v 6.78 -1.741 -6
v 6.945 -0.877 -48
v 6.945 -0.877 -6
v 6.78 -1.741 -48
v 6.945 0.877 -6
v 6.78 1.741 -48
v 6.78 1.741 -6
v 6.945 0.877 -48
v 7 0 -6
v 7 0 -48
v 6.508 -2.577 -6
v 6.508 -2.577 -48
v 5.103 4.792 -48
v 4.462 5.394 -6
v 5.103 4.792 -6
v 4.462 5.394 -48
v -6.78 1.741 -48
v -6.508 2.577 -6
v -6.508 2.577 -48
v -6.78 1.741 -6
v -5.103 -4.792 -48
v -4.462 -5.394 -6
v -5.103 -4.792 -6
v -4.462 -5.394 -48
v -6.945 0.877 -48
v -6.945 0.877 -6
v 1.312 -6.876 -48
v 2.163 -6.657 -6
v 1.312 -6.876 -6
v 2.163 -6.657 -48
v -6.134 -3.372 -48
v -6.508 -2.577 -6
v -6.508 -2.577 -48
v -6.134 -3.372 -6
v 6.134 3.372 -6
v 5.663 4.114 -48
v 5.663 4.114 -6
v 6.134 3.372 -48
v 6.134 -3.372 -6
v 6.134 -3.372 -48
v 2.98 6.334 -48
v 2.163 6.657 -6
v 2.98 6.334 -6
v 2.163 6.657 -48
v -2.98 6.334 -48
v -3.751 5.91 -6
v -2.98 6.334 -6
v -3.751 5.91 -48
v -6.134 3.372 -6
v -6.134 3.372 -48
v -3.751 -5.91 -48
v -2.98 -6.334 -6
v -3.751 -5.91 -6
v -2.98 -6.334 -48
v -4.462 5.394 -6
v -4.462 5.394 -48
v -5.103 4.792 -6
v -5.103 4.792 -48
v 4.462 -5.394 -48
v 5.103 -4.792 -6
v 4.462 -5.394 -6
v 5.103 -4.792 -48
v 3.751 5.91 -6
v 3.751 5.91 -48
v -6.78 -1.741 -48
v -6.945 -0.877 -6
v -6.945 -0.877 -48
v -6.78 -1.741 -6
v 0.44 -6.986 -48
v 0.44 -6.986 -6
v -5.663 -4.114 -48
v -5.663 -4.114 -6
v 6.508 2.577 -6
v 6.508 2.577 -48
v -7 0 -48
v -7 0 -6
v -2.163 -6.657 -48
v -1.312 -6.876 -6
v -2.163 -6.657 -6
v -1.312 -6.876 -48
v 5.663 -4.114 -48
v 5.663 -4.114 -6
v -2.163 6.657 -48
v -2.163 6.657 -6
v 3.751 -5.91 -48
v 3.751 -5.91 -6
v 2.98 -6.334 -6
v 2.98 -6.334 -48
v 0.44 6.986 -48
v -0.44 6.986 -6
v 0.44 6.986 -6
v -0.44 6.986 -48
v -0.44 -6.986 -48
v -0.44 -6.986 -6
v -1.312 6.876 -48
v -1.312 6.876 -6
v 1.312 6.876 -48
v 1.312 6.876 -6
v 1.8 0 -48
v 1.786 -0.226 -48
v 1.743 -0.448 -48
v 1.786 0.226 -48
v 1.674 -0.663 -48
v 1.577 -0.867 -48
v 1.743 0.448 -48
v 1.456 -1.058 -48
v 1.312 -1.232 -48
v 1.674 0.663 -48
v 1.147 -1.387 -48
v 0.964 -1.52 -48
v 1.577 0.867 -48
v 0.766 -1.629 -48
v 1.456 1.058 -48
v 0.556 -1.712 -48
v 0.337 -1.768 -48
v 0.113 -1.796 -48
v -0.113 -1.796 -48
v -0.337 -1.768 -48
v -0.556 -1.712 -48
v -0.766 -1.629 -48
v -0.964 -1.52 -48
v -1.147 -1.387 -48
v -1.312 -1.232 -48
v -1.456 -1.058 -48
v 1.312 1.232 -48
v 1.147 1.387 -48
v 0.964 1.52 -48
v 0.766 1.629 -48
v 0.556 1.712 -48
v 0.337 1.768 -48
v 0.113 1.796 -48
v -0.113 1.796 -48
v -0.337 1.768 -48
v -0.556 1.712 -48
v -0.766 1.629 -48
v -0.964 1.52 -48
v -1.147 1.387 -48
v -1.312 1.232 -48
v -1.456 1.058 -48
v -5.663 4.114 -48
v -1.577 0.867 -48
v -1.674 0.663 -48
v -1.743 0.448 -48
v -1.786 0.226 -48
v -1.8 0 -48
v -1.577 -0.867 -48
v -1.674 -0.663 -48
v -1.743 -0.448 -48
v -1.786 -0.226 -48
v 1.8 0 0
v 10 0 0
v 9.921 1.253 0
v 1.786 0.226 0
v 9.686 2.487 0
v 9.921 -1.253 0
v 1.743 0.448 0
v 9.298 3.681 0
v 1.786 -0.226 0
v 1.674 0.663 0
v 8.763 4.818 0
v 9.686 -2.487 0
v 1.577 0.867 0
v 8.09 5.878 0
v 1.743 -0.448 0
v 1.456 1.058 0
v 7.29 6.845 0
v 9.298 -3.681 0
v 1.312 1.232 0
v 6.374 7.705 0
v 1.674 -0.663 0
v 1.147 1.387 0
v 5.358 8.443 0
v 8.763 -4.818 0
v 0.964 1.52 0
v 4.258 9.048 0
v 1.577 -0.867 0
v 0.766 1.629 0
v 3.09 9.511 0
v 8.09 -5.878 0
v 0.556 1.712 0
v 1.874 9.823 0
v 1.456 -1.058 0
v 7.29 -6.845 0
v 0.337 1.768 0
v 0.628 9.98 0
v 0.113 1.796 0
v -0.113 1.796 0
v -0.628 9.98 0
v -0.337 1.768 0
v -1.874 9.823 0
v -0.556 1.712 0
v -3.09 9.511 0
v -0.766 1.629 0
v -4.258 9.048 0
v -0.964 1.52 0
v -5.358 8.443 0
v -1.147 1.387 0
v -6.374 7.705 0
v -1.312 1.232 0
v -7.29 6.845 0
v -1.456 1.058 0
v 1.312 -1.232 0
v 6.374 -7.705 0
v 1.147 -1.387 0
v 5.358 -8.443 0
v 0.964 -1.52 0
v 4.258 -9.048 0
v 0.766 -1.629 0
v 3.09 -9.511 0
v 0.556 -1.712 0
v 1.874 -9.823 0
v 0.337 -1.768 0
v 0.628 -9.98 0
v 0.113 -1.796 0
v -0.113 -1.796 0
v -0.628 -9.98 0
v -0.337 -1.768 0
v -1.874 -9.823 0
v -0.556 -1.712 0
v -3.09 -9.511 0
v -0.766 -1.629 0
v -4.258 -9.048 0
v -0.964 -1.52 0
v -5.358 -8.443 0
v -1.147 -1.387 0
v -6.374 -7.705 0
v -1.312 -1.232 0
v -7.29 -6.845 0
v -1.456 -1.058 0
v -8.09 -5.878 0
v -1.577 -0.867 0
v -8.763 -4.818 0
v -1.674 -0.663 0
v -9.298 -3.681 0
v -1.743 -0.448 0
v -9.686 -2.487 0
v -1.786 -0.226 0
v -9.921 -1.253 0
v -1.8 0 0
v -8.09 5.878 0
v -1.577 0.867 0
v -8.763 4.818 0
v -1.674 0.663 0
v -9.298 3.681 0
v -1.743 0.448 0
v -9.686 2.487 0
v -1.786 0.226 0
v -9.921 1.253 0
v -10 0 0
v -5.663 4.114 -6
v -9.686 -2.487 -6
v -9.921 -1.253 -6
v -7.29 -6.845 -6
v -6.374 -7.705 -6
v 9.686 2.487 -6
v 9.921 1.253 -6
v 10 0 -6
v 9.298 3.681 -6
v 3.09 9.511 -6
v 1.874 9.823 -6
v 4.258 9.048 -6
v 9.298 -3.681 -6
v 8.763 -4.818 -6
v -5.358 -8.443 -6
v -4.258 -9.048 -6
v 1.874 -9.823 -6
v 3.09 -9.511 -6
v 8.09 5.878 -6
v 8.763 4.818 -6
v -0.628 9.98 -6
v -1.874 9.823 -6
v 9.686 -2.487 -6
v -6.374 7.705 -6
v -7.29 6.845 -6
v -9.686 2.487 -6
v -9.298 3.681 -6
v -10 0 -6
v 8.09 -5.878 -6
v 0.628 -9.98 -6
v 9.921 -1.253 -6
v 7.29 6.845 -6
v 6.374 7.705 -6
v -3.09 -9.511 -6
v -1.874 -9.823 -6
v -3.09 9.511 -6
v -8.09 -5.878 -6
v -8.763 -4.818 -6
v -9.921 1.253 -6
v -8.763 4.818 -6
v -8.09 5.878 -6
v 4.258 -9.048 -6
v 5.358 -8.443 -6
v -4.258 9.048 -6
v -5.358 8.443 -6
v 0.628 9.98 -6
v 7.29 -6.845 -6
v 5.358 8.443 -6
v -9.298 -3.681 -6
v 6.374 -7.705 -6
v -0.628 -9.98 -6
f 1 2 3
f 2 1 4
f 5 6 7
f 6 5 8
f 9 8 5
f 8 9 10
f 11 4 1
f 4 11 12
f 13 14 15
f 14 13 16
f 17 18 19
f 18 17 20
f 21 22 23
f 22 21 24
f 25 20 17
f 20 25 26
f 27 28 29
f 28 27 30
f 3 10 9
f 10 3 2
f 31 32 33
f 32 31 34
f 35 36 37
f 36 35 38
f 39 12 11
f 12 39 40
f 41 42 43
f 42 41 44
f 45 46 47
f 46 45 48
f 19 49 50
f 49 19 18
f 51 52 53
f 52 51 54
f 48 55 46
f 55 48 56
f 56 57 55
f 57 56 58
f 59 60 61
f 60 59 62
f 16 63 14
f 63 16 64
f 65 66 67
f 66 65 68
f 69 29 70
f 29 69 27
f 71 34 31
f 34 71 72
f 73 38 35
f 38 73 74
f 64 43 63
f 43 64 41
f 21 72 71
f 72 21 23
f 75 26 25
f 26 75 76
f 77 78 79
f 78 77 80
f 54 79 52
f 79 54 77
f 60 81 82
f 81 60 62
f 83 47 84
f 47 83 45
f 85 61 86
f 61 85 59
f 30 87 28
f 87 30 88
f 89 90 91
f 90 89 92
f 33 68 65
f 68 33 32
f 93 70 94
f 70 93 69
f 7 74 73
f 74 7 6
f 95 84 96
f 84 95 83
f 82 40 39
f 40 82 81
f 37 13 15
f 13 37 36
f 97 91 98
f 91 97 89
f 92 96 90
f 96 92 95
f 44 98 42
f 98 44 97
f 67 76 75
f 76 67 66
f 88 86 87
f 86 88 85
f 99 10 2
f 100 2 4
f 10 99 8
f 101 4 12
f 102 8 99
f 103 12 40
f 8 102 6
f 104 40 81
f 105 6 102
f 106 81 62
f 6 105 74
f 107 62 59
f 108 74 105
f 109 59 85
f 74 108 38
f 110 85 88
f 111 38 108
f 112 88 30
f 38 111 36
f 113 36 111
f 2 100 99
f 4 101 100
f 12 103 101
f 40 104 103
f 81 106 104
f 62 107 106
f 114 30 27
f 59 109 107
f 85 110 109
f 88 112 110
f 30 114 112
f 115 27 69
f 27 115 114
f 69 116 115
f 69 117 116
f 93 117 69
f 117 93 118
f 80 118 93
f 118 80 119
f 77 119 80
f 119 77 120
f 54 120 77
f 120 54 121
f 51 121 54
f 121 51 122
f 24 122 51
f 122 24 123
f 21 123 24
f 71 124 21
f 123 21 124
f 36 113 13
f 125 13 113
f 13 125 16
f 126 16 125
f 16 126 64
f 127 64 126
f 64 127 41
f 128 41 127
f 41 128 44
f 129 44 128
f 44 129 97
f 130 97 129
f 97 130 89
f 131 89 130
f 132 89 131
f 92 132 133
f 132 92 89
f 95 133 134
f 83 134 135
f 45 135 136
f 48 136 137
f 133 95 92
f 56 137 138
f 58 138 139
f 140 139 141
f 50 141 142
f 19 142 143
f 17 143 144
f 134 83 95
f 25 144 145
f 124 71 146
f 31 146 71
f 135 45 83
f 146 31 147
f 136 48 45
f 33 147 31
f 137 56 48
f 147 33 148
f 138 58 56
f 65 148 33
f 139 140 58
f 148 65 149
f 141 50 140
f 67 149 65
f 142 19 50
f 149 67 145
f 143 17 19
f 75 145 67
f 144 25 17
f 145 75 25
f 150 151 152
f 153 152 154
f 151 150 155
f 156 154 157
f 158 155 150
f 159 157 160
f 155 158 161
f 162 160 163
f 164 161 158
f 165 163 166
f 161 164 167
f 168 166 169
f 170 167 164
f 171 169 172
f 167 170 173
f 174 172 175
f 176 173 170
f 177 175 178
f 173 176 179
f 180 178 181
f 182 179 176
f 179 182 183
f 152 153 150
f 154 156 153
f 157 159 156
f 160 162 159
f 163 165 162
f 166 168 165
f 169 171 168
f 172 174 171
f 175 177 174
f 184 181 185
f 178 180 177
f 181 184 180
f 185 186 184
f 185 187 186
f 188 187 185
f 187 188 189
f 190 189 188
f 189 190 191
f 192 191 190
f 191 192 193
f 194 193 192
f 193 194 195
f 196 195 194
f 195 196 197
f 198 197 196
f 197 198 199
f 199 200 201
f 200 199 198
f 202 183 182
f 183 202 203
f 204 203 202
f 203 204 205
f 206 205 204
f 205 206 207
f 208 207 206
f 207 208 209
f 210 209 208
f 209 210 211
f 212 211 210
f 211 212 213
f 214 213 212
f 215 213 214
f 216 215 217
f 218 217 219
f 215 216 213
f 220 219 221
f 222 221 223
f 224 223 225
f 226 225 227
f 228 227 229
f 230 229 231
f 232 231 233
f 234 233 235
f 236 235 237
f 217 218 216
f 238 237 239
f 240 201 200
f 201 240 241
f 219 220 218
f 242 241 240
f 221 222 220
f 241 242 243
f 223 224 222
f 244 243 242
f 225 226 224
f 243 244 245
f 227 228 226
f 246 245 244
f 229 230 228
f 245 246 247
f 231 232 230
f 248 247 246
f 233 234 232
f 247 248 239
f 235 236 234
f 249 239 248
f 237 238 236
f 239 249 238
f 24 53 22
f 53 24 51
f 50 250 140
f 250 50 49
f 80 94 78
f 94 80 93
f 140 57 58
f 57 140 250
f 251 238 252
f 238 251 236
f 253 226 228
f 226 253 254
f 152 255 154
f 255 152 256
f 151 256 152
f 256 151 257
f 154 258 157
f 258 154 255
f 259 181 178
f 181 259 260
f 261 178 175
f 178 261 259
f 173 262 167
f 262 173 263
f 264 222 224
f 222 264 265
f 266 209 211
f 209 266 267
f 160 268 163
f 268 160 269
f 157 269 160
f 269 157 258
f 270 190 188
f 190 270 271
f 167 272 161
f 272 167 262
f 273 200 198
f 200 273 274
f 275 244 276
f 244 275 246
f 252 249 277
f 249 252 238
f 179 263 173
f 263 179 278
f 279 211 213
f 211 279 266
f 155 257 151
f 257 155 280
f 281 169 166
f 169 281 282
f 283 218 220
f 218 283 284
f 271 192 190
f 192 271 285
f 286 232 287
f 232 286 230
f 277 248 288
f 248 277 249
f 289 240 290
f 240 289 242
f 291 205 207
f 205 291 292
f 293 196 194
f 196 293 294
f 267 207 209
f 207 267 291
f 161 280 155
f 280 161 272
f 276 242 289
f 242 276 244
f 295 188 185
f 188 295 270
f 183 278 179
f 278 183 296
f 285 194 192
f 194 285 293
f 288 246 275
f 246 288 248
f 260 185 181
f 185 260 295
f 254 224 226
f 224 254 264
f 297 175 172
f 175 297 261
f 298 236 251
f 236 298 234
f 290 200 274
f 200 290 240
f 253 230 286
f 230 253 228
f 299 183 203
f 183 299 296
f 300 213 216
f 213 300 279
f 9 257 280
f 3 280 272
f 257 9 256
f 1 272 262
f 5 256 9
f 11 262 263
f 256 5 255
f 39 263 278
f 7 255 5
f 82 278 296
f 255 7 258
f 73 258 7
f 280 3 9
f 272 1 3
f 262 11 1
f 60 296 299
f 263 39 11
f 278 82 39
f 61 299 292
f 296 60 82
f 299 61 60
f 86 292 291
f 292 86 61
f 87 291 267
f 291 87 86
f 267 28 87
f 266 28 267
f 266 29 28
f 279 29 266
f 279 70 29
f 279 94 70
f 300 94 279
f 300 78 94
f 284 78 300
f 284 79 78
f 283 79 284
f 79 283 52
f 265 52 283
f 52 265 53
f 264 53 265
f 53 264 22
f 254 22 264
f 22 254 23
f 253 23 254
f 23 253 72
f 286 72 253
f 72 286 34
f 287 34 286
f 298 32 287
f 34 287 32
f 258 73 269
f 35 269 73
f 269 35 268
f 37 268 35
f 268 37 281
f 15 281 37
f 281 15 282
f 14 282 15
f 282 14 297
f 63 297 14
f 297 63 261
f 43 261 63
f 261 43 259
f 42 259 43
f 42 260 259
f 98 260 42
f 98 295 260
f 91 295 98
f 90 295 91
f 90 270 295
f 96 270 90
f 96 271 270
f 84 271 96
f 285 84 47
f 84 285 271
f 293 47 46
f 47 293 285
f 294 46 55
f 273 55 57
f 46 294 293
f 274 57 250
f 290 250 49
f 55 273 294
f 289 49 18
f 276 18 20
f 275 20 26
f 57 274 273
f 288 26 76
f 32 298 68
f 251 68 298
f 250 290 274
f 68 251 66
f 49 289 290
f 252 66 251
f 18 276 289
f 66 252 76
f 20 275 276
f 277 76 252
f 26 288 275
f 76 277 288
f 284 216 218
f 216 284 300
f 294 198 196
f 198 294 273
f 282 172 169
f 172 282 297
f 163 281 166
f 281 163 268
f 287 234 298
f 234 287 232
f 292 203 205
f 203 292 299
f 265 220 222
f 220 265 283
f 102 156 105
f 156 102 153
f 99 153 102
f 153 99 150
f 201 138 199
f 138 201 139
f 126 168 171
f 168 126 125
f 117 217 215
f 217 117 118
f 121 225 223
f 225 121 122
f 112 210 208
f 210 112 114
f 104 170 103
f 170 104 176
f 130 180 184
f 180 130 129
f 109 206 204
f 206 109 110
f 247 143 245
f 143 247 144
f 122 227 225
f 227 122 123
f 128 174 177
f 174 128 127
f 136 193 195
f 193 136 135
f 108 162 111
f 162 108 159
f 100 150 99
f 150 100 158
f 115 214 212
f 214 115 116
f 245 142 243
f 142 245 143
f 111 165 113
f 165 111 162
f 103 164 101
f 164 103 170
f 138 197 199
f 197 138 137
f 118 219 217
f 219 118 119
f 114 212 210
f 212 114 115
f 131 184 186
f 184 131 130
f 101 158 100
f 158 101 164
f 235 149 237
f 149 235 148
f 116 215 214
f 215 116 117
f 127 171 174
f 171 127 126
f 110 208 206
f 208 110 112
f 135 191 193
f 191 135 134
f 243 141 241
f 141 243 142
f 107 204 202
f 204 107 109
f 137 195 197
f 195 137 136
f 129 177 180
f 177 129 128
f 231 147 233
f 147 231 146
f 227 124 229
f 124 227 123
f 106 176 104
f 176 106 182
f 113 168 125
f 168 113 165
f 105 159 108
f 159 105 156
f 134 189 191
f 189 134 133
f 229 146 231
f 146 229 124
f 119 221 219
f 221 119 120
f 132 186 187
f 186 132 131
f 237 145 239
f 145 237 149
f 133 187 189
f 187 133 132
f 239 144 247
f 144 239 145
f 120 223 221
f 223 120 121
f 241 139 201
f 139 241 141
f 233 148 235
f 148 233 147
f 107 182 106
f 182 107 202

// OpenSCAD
$fn = 50;


difference() {
	union() {
		translate(v = [0, 0, -48.0000000000]) {
			cylinder(h = 48, r = 7.0000000000);
		}
		translate(v = [0, 0, -6.0000000000]) {
			cylinder(h = 6, r = 10.0000000000);
		}
	}
	union() {
		#translate(v = [0, 0, -48]) {
			cylinder(h = 48, r = 1.8000000000);
		}
	}
}
